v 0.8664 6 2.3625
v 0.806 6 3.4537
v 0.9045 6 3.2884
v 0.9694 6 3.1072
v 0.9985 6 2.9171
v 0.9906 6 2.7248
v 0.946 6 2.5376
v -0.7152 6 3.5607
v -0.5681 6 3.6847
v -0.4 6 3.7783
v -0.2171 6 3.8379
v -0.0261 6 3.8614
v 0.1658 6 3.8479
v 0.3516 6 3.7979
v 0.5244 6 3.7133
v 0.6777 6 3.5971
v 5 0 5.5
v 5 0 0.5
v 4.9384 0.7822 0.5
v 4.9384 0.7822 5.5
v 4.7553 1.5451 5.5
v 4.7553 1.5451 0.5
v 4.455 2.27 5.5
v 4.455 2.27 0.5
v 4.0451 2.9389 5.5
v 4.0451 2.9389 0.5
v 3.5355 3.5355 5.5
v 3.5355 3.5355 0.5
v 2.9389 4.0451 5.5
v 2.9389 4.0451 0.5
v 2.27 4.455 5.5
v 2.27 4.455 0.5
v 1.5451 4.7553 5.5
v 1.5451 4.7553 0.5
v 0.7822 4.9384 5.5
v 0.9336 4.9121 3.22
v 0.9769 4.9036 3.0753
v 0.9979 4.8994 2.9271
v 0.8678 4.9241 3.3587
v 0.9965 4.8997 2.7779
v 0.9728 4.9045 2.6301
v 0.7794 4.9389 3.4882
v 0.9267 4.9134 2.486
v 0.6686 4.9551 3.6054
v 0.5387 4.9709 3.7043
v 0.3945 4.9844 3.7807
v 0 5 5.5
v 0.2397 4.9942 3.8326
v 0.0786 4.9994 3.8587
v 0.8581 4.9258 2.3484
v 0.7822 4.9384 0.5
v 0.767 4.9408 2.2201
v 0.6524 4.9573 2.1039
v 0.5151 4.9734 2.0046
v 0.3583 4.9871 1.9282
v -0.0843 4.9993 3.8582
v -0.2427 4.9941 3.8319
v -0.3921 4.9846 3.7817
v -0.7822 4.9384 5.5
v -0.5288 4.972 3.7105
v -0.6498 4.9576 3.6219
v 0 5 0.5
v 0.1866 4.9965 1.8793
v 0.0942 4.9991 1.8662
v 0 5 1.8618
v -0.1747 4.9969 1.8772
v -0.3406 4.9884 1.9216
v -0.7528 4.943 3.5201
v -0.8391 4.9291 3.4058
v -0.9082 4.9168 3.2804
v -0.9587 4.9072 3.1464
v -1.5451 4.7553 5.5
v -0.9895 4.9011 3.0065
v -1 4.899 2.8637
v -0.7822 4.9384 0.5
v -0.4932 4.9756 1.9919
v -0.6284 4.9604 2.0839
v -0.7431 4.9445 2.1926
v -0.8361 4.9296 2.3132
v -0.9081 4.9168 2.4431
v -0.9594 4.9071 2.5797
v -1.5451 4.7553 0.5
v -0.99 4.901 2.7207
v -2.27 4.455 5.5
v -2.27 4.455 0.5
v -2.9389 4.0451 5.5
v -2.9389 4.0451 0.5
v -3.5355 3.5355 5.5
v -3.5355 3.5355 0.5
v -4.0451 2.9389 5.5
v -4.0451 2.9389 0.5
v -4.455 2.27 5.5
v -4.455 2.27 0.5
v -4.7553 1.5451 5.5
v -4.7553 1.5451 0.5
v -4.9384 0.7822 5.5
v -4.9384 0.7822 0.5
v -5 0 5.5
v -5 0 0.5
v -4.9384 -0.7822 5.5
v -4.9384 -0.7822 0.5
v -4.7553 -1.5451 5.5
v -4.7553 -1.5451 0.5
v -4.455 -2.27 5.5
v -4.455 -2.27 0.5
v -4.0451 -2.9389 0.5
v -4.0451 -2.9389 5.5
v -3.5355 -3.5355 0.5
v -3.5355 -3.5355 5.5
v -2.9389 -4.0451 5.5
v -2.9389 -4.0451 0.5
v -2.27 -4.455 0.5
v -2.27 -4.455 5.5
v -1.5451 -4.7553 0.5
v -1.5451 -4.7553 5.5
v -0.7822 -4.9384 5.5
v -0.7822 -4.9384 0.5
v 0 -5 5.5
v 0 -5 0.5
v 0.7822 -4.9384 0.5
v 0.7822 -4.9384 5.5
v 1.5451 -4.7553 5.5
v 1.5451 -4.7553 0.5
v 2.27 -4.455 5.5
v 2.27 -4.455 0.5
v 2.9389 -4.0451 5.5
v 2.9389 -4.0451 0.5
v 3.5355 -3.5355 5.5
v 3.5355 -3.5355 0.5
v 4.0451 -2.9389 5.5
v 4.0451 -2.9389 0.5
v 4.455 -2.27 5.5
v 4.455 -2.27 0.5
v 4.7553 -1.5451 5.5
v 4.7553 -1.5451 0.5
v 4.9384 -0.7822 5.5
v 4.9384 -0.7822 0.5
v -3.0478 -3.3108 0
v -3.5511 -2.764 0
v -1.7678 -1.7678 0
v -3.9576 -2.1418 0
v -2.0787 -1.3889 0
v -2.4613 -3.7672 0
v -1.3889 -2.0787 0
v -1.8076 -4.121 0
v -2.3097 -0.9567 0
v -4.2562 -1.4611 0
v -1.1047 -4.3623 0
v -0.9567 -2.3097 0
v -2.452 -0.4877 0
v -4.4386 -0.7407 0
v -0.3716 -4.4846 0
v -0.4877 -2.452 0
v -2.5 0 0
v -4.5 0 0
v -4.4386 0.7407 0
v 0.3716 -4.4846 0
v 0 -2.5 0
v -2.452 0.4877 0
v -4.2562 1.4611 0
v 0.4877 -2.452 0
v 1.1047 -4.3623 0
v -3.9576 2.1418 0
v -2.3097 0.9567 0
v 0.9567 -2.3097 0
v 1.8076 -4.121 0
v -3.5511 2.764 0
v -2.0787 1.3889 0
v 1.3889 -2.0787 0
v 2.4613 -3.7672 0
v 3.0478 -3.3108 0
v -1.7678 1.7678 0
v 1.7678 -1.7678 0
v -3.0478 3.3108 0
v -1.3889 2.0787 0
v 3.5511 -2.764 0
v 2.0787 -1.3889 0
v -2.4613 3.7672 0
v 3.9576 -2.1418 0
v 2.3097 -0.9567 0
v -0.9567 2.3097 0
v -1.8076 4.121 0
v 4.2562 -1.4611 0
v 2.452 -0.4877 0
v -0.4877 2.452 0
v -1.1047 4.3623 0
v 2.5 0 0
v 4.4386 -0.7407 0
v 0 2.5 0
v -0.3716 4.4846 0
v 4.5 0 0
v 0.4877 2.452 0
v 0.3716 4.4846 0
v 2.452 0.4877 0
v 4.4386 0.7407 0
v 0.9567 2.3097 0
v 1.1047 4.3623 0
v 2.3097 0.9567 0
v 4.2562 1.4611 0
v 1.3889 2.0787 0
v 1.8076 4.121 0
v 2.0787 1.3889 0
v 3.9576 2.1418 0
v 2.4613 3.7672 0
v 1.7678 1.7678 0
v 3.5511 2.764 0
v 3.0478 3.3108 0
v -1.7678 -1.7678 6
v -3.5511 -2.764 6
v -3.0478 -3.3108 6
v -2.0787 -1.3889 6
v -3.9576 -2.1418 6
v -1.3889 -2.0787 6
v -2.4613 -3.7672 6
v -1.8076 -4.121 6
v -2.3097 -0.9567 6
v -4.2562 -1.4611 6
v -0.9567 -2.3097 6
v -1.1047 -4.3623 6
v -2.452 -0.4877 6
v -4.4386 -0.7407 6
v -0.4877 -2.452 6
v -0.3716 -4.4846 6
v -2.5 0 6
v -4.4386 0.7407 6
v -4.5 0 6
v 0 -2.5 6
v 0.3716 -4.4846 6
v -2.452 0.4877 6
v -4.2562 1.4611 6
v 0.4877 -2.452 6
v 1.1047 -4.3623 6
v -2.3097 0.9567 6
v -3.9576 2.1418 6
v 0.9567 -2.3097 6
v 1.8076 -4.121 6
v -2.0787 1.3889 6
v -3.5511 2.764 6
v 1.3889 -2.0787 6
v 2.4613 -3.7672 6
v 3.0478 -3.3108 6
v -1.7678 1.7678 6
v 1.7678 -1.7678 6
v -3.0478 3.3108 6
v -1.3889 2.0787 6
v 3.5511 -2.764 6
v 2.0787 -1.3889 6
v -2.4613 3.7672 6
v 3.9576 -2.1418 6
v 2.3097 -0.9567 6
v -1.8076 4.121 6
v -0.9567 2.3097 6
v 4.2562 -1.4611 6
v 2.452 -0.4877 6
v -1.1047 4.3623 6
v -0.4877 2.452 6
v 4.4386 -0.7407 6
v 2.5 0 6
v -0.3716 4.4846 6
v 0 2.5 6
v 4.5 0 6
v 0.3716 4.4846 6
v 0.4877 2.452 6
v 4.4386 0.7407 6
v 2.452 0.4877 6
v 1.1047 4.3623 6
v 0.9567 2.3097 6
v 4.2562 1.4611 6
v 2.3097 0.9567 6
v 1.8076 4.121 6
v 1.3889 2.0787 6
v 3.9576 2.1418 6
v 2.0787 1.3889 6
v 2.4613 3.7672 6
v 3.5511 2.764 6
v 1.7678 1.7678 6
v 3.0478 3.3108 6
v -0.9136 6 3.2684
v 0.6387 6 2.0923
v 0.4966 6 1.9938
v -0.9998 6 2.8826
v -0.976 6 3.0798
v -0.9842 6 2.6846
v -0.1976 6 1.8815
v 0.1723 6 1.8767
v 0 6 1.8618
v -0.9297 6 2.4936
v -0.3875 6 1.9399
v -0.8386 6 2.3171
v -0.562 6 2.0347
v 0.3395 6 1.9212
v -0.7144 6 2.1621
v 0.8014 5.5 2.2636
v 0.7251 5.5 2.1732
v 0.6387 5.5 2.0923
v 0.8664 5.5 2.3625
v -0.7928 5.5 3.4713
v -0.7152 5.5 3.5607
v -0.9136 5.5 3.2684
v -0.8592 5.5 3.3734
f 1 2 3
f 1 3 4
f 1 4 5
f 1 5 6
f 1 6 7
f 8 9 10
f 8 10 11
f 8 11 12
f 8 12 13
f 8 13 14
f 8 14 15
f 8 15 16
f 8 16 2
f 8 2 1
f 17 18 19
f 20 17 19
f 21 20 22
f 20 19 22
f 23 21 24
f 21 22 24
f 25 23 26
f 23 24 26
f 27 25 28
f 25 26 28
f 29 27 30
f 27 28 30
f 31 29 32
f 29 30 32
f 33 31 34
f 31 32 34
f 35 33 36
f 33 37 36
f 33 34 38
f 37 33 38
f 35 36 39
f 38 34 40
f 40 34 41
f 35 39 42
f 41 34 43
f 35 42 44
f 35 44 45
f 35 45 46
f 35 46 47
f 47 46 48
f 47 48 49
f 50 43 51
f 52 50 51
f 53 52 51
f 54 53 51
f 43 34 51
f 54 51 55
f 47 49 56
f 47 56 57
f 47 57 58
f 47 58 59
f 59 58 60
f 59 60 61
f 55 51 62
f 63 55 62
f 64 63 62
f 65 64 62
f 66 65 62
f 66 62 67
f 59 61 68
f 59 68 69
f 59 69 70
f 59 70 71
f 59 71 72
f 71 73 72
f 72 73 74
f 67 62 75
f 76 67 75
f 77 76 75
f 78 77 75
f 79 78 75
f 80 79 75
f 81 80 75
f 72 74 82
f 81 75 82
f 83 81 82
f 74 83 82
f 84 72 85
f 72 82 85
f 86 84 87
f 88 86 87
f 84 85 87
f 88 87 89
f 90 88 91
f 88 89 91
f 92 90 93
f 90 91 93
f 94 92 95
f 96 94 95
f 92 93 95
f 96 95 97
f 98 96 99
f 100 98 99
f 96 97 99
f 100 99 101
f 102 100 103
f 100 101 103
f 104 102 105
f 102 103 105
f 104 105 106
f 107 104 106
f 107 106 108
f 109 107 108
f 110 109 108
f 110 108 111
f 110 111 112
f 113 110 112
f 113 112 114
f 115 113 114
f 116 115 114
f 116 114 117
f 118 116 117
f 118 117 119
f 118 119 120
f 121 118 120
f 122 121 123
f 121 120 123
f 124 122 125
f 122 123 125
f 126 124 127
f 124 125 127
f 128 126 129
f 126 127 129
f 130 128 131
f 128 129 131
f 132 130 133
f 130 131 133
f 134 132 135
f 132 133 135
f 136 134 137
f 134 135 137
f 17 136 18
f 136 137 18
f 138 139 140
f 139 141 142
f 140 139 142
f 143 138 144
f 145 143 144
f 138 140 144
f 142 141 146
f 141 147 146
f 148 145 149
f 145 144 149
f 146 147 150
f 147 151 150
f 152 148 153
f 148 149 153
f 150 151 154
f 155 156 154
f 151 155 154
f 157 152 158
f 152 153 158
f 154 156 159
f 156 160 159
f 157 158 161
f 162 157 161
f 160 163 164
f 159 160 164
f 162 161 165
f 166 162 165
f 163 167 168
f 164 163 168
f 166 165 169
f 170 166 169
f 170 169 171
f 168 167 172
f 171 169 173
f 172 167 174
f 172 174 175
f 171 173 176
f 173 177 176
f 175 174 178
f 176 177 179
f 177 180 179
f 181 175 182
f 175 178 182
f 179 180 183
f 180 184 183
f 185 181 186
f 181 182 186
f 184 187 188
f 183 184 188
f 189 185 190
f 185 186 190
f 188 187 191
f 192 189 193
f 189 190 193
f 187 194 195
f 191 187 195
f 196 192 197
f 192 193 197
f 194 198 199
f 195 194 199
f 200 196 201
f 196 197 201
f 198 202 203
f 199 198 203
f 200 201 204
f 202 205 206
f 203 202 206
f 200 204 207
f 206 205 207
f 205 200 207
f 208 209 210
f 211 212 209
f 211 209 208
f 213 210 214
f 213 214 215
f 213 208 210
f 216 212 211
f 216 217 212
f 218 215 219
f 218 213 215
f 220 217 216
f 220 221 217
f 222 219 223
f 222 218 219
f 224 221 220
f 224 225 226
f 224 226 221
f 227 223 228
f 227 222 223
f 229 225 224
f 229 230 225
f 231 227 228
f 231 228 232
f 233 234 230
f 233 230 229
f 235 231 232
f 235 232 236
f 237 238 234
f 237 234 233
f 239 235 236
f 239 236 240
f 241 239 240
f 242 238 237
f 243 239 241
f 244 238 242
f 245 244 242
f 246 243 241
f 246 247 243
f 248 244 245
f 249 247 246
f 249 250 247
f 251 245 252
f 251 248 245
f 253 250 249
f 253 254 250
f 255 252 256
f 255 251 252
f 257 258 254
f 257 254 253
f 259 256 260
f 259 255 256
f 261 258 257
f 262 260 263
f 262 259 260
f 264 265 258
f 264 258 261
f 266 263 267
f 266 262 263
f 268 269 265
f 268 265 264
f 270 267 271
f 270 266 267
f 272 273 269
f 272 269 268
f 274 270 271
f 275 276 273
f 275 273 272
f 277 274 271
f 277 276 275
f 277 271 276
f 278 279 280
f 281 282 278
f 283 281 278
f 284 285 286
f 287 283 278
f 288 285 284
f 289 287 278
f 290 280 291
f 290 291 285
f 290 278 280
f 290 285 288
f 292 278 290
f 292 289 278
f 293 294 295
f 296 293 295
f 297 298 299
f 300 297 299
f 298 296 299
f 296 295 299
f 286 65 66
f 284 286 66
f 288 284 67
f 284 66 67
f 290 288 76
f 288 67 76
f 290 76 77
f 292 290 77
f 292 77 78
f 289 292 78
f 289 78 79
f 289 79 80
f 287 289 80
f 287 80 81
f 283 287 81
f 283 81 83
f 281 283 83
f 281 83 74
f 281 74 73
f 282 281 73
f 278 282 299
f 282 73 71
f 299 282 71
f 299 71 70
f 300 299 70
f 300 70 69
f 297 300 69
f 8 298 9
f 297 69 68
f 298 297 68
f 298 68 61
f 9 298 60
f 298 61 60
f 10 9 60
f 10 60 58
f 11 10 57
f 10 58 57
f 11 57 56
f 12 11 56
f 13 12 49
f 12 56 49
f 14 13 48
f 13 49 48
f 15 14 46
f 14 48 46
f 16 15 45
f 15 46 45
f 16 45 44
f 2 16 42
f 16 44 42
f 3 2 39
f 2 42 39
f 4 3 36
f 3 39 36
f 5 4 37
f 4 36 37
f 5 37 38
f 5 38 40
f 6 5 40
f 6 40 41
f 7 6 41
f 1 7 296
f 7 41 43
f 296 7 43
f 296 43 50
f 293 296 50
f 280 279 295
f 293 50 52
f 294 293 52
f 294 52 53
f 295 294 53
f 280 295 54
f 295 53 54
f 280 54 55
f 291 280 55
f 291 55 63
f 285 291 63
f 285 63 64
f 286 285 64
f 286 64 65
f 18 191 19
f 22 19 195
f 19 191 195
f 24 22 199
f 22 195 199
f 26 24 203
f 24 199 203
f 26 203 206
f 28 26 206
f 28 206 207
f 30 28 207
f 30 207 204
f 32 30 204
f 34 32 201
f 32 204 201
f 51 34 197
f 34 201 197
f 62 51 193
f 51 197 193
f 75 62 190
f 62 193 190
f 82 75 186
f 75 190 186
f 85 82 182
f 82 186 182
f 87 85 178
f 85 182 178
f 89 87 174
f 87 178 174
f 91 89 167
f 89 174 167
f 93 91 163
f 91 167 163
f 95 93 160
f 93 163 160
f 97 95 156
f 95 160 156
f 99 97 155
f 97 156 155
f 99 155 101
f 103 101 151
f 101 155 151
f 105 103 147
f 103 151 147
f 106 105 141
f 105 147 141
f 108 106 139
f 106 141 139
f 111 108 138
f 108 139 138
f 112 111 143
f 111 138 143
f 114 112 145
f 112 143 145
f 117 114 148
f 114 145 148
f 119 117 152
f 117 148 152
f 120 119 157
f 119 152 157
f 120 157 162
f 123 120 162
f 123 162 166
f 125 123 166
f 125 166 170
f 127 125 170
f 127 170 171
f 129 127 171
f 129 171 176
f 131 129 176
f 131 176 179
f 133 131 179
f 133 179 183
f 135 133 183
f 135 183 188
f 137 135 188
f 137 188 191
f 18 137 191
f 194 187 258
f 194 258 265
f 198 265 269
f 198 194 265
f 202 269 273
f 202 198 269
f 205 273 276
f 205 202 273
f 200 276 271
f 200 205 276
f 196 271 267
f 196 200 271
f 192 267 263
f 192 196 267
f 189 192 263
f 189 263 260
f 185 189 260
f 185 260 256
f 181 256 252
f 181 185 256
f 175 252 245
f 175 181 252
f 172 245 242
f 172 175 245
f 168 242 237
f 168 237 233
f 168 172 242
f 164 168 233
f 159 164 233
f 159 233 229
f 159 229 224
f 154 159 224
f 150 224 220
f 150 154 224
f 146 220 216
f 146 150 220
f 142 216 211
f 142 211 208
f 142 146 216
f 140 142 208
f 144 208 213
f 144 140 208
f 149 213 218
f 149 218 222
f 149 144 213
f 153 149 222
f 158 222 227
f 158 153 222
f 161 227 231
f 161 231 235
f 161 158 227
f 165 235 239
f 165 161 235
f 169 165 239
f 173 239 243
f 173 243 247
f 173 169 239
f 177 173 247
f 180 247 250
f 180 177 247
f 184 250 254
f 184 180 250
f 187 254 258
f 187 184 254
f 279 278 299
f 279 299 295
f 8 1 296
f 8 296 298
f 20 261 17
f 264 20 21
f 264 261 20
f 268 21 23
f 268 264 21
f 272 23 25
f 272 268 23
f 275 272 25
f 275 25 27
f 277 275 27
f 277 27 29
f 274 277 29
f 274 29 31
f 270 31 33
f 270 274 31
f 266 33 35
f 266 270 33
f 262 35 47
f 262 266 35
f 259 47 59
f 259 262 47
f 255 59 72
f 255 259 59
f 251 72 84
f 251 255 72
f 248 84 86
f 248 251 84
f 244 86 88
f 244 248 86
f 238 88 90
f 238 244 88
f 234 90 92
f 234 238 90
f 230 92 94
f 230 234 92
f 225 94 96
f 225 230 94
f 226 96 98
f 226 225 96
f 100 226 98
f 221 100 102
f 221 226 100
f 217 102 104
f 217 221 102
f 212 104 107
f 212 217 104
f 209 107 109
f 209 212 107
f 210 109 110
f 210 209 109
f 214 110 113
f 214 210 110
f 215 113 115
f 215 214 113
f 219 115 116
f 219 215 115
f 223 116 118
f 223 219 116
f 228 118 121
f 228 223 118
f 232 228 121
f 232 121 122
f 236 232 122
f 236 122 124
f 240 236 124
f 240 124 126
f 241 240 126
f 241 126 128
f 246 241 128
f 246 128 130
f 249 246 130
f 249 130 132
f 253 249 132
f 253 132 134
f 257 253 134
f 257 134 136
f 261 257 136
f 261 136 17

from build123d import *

# Parameters (mm, degrees)
SKETCH2_R           = 5
SKETCH2_R_2         = 2.5
BOSS_EXTRUDE1_DEPTH = 6
CHAMFER1_SIZE       = 0.5
SKETCH4_R           = 1
BOSS_EXTRUDE2_DEPTH = 2
CUT_EXTRUDE2_DEPTH  = 0.5
CHAMFER2_SIZE       = 0.5


with BuildPart() as part:
    # Sketch2 → Boss-Extrude1 (new body)
    with BuildSketch(Plane.XY):
        Circle(SKETCH2_R)
        Circle(SKETCH2_R_2, mode=Mode.SUBTRACT)
    extrude(amount=BOSS_EXTRUDE1_DEPTH)

    # Chamfer1
    chamfer1_edges = [part.edges().sort_by_distance(p)[0] for p in [
        (-5, 0, 6),
    ]]
    chamfer(chamfer1_edges, length=CHAMFER1_SIZE)

    # Sketch4 → Boss-Extrude2 (add)
    with BuildSketch(Plane(origin=(0, 4, 0), x_dir=(1, 0, 0), z_dir=(0, 1, 0))):
        with Locations(Location((0, -2.861781198, 0), (0, 0, 90))):
            Circle(SKETCH4_R)
    extrude(amount=BOSS_EXTRUDE2_DEPTH)

    # Sketch5 → Cut-Extrude2 (cut)
    with BuildSketch(Plane(origin=(0, 6, 0), x_dir=(1, 0, 0), z_dir=(0, 1, 0))):
        Polygon((-1.135229539, -3.436253086), (0.891979559, -1.900488617), (1.105020903, -2.181703191), (-0.922188195, -3.71746766), align=None)
    extrude(amount=-CUT_EXTRUDE2_DEPTH, mode=Mode.SUBTRACT)

    # Chamfer2
    chamfer2_edges = [part.edges().sort_by_distance(p)[0] for p in [
        (-5, 0, 0),
    ]]
    chamfer(chamfer2_edges, length=CHAMFER2_SIZE)


solid = part.part
